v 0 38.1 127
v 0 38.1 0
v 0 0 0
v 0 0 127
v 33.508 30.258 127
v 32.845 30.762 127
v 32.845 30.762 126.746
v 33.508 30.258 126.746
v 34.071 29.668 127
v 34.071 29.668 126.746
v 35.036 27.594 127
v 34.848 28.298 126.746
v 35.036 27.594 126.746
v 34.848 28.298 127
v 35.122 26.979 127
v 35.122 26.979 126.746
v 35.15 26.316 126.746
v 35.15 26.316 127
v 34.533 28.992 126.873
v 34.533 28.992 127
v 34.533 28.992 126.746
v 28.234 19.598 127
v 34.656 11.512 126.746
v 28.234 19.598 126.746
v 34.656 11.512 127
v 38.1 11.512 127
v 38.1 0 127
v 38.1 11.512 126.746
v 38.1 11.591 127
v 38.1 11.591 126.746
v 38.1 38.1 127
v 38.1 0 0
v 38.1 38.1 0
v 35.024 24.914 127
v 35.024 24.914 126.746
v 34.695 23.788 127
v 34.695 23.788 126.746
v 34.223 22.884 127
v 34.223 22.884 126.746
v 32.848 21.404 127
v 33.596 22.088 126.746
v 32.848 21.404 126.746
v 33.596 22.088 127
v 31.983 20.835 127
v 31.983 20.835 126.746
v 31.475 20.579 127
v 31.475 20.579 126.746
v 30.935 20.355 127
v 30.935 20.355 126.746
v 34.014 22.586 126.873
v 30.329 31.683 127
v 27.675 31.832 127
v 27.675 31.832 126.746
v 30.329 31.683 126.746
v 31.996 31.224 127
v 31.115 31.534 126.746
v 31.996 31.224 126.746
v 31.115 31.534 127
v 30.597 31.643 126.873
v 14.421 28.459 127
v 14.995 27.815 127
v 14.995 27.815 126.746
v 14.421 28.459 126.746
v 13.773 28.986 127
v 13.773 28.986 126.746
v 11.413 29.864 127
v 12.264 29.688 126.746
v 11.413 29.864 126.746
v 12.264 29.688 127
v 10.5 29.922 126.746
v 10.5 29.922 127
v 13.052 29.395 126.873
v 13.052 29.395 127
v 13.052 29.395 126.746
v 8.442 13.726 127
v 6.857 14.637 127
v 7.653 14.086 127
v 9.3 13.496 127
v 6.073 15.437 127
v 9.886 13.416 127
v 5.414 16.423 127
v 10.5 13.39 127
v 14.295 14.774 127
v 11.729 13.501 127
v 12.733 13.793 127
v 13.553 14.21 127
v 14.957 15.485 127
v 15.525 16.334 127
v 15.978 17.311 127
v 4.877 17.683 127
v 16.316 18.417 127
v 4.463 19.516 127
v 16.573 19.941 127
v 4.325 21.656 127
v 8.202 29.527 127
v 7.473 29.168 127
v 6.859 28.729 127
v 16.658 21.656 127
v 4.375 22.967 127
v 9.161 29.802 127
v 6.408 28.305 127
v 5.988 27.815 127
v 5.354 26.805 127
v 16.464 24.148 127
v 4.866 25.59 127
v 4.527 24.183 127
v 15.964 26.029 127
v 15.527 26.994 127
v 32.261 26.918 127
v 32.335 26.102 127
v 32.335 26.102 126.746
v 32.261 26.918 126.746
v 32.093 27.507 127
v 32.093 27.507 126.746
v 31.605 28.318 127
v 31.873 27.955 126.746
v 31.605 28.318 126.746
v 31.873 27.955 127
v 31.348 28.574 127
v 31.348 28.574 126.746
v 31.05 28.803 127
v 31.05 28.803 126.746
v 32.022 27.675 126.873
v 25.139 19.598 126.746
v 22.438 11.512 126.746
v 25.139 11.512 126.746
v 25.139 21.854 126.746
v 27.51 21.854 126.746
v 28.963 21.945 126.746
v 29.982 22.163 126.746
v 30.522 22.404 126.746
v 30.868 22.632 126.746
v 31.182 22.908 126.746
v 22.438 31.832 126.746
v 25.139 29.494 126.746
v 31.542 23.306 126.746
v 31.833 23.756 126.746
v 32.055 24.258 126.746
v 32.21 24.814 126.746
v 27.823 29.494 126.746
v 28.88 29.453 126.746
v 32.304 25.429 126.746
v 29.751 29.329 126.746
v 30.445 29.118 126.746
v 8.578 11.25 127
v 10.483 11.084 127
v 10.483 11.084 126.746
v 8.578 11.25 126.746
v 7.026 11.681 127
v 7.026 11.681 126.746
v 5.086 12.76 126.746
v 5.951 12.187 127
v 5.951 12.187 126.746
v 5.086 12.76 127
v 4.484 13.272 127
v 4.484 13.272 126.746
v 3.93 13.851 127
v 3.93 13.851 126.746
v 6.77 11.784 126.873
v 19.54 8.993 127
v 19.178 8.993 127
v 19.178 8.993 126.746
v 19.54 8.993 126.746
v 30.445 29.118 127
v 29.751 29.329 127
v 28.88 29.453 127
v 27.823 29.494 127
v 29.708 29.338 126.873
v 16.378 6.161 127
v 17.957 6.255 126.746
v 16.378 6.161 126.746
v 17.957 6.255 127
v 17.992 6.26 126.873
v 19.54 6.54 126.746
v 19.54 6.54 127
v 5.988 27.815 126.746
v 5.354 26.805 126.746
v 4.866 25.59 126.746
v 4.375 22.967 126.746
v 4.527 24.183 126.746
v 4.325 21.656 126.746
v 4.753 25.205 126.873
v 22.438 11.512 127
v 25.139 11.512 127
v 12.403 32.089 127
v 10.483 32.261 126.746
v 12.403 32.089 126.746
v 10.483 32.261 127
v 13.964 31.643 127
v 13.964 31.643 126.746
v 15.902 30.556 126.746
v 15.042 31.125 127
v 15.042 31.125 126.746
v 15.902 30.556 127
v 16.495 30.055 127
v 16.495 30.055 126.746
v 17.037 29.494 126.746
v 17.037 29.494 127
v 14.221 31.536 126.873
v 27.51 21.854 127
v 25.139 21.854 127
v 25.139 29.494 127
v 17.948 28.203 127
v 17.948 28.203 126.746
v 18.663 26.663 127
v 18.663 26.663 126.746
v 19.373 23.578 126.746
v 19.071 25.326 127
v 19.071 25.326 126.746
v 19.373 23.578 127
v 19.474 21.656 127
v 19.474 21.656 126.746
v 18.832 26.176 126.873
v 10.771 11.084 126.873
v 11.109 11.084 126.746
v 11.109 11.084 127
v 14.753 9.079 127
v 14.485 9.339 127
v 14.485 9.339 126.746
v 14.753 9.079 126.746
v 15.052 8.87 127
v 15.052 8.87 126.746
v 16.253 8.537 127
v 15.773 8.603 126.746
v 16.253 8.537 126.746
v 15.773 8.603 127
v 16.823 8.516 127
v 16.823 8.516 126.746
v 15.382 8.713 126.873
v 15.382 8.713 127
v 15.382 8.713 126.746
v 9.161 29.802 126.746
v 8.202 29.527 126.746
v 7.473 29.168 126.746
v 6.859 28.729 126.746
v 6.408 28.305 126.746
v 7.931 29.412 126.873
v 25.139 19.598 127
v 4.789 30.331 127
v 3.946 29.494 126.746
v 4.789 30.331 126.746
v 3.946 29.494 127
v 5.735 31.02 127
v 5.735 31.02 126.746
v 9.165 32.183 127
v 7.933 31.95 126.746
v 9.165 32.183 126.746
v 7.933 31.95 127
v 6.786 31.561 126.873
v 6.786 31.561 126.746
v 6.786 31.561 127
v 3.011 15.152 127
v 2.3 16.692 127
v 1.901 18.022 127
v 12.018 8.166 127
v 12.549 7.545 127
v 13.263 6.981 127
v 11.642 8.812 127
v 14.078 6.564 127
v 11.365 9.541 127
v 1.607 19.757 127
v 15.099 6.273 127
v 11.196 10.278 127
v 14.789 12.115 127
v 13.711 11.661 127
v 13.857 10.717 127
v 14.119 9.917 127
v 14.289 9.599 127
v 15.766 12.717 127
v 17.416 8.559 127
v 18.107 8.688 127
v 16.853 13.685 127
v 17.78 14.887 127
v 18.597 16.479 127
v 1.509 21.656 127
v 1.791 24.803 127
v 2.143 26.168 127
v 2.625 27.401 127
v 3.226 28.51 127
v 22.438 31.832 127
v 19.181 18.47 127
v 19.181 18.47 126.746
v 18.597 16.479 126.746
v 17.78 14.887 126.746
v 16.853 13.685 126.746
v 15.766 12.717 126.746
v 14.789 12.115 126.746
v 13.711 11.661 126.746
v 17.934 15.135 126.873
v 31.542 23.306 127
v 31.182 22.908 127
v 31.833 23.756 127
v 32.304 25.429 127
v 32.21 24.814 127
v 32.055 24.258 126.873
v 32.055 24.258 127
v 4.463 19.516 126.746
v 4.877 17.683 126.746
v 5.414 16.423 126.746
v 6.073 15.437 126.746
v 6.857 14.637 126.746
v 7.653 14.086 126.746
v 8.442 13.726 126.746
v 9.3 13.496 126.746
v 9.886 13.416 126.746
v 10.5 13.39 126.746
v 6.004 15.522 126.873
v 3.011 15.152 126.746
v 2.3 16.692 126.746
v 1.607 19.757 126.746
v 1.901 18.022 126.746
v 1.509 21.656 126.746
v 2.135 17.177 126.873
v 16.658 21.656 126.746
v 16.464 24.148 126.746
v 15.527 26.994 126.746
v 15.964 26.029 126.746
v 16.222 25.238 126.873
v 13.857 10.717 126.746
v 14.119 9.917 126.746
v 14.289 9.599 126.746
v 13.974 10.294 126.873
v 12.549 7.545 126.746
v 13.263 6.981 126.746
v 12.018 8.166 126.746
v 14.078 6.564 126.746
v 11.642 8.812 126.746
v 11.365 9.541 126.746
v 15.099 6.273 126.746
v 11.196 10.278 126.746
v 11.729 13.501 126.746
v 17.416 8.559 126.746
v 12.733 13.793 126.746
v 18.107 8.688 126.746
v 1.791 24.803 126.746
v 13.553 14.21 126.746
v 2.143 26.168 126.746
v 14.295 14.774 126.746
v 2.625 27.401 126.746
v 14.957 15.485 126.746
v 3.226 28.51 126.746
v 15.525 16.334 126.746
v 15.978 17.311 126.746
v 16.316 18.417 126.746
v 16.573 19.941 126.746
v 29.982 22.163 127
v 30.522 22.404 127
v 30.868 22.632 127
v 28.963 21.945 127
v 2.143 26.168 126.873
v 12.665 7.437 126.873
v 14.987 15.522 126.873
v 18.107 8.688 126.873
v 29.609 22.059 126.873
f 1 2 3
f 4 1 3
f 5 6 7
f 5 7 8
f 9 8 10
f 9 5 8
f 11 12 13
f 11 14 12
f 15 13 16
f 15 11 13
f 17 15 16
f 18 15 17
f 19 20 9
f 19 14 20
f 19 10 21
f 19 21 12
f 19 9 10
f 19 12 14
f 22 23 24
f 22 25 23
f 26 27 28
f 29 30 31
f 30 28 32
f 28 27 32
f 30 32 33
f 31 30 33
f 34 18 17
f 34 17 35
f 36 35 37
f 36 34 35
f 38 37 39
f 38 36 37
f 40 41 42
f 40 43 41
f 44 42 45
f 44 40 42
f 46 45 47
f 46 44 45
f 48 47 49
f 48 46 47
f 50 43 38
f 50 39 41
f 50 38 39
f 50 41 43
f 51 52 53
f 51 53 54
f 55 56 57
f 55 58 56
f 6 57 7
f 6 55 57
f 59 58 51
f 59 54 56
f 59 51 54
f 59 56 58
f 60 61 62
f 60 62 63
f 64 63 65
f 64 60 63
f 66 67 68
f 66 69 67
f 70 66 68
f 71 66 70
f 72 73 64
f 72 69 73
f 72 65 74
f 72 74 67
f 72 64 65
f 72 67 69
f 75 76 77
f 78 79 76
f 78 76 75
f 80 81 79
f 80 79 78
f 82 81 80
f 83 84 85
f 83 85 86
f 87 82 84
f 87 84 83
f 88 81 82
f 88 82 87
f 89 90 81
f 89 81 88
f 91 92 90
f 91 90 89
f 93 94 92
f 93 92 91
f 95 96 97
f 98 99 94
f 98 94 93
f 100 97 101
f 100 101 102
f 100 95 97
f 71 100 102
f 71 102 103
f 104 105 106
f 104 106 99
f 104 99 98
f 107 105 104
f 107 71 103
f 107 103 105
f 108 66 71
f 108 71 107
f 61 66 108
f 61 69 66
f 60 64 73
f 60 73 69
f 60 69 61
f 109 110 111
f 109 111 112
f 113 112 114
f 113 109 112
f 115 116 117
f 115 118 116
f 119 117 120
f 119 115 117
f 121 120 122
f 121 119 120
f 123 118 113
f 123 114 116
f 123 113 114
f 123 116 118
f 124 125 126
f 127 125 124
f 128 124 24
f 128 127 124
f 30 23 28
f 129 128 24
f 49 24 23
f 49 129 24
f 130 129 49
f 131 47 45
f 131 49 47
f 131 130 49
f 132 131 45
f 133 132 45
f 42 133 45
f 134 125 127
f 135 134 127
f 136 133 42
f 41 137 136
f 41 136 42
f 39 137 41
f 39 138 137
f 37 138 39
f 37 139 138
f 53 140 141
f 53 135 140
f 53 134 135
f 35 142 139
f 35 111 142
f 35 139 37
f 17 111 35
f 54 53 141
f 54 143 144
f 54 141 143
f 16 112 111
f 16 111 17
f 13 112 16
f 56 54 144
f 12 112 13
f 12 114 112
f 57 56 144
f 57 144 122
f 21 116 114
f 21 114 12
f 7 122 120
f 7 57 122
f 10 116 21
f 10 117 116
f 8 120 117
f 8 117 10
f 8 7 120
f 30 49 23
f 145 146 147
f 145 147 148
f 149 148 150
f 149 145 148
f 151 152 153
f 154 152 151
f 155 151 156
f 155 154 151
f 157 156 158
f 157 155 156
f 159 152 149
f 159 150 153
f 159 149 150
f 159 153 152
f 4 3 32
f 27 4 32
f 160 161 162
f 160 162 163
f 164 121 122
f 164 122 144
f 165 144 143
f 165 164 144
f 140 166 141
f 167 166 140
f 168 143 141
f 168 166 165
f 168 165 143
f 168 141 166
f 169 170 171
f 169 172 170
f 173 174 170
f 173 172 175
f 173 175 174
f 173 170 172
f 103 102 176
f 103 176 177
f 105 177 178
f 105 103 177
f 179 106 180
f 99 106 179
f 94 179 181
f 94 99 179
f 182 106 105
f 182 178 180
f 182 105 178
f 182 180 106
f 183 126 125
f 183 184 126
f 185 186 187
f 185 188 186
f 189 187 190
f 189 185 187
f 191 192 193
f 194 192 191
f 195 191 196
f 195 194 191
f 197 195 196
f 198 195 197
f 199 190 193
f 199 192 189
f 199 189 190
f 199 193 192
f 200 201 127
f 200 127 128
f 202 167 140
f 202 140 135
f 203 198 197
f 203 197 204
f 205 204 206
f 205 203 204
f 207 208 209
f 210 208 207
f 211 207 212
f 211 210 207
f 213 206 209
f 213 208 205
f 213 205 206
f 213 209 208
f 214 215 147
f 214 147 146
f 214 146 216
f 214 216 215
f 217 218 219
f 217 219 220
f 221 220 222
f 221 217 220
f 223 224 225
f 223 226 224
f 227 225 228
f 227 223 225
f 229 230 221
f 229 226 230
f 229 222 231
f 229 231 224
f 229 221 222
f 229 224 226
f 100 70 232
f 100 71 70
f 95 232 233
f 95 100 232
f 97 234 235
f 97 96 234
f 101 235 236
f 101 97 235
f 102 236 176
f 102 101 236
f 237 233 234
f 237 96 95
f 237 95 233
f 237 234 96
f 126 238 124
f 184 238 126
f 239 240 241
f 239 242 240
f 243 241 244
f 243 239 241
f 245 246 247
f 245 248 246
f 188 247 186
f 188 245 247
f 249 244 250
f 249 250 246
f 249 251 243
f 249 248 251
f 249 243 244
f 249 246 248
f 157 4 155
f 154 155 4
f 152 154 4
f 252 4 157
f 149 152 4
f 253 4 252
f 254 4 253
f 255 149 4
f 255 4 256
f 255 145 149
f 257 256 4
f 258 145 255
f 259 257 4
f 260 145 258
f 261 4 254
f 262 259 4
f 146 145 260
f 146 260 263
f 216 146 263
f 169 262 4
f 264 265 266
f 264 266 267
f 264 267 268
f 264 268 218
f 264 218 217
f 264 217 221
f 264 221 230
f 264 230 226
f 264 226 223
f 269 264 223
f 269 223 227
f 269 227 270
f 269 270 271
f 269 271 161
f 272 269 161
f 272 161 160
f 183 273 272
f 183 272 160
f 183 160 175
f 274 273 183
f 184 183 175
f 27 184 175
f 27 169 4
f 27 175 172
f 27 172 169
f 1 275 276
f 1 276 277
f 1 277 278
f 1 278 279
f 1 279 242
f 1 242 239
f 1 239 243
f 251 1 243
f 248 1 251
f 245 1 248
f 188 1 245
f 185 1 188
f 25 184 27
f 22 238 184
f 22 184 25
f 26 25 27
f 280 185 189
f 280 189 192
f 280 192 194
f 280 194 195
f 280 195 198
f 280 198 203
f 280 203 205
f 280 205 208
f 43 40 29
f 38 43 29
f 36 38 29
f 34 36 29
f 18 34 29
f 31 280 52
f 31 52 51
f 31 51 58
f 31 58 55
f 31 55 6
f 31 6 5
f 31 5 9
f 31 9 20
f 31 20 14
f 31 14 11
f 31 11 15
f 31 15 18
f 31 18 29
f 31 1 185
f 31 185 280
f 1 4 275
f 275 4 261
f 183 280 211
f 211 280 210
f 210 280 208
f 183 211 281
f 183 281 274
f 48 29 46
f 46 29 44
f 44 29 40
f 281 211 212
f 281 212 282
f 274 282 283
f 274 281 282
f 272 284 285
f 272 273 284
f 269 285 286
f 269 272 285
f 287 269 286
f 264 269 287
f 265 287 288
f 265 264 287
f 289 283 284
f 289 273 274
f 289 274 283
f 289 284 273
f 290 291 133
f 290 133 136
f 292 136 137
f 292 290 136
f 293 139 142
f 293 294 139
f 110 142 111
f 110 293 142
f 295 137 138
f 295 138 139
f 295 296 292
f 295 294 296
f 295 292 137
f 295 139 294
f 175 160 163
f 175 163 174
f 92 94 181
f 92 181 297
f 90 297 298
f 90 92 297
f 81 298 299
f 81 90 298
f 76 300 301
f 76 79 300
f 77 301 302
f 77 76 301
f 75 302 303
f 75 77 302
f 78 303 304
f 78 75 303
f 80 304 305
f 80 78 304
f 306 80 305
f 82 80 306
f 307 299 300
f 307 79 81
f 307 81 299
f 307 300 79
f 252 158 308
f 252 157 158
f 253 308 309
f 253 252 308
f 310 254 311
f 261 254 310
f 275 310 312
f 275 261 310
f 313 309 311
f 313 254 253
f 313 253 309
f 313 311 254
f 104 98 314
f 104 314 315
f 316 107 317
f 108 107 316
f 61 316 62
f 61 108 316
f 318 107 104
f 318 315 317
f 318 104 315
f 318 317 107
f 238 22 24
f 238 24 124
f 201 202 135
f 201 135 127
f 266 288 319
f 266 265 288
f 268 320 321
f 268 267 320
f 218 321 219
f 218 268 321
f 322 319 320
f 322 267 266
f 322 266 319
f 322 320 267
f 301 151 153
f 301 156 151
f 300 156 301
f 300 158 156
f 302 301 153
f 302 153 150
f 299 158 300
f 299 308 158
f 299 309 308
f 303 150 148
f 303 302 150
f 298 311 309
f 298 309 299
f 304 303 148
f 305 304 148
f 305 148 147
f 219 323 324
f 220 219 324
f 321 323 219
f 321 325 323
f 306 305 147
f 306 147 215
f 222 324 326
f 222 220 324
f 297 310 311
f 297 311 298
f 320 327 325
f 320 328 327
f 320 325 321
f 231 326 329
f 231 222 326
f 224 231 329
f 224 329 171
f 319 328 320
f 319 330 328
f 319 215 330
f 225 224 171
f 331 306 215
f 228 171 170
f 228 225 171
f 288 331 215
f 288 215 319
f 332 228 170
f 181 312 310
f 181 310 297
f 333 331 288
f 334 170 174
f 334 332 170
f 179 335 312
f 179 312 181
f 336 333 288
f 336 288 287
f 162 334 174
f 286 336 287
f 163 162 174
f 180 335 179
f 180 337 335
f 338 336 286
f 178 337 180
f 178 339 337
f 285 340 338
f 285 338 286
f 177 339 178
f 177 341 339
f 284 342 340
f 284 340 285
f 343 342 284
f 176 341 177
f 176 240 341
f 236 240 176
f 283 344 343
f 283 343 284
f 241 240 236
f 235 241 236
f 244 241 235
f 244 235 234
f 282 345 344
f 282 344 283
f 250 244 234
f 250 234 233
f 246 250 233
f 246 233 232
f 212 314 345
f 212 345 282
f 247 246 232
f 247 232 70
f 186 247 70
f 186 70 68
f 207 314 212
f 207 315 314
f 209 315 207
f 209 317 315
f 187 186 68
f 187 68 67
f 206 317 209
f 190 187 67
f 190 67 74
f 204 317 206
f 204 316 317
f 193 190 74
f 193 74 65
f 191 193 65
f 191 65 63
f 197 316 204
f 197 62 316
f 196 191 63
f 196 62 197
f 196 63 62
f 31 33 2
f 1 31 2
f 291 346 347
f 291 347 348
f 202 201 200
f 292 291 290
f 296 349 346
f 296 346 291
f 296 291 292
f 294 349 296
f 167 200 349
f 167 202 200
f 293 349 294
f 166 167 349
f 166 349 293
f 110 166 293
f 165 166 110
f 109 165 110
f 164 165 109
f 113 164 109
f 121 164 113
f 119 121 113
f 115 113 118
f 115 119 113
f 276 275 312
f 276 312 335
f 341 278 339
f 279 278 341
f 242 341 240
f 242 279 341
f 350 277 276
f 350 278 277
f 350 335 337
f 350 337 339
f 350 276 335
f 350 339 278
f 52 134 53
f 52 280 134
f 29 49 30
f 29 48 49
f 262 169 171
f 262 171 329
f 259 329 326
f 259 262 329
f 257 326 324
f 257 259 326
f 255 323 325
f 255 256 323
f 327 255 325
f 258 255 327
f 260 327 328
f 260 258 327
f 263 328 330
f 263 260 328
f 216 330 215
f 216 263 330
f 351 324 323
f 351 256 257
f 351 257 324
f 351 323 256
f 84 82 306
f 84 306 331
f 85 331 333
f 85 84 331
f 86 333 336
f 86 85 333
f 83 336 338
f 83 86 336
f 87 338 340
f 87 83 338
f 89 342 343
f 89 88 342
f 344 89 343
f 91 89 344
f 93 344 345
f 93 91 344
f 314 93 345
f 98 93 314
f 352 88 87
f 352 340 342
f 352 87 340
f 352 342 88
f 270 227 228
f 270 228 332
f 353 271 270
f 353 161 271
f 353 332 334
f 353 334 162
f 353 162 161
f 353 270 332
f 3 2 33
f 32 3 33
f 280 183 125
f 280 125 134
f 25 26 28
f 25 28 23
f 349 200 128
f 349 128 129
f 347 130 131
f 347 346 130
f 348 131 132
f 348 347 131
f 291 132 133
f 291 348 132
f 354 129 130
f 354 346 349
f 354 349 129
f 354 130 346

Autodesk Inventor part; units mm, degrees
ref_plane "YZ Plane" through (0, 0, 0) normal (1, 0, 0) x (0, 1, 0)
ref_plane "XZ Plane" through (0, 0, 0) normal (0, 1, 0) x (-1, 0, 0)
ref_plane "XY Plane" through (0, 0, 0) normal (0, 0, 1) x (1, 0, 0)
sketch "Sketch1" plane through (0, 0, 0) normal (0, 0, 1) x (1, 0, 0)
  line L0 (0, 0) -> (38.1, 0)
  line L1 (38.1, 0) -> (38.1, 38.1)
  line L2 (38.1, 38.1) -> (0, 38.1)
  line L3 (0, 38.1) -> (0, 0)
  dimension "d0" = 38.1
  dimension "d1" = 38.1
extrude "Extrusion1" add sketch "Sketch1" along normal blind 127
sketch "Sketch2" plane through (0, 0, 127) normal (0, 0, 1) x (1, 0, 0)
  line L0 (0.6032, 32.2606) -> (46.9983, 32.2606) construction
  line L1 (46.9983, 32.2606) -> (46.9983, -9.6319) construction
  line L2 (46.9983, -9.6319) -> (0.6032, -9.6319) construction
  line L3 (0.6032, -9.6319) -> (0.6032, 32.2606) construction
  spline S0 degree 2 poles (19.54, 6.5395) (18.799, 6.3584) (17.1852, 6.1608) (16.3784, 6.1608) knots 0 0 0 1 2 2 2
  spline S1 degree 2 poles (16.3784, 6.1608) (14.0895, 6.1608) (11.2407, 8.7131) (11.109, 11.0843) knots 0 0 0 1 2 2 2
  spline S2 degree 2 poles (11.109, 11.0843) (10.9279, 11.0843) (10.615, 11.0843) (10.4833, 11.0843) knots 0 0 0 1 2 2 2
  spline S3 degree 2 poles (10.4833, 11.0843) (8.4249, 11.0843) (5.1151, 12.484) (3.9295, 13.8508) knots 0 0 0 1 2 2 2
  spline S4 degree 2 poles (3.9295, 13.8508) (2.7604, 15.201) (1.5089, 19.1531) (1.5089, 21.656) knots 0 0 0 1 2 2 2
  spline S5 degree 2 poles (1.5089, 21.656) (1.5089, 24.2248) (2.7768, 28.111) (3.946, 29.4942) knots 0 0 0 1 2 2 2
  spline S6 degree 2 poles (3.946, 29.4942) (5.1316, 30.8609) (8.4414, 32.2606) (10.4833, 32.2606) knots 0 0 0 1 2 2 2
  spline S7 degree 2 poles (10.4833, 32.2606) (12.5581, 32.2606) (15.8844, 30.8115) (17.037, 29.4942) knots 0 0 0 1 2 2 2
  spline S8 degree 2 poles (17.037, 29.4942) (18.1897, 28.1604) (19.4741, 24.1919) (19.4741, 21.656) knots 0 0 0 1 2 2 2
  spline S9 degree 2 poles (19.4741, 21.656) (19.4741, 17.704) (16.3948, 12.5664) (13.7108, 11.6607) knots 0 0 0 1 2 2 2
  spline S10 degree 2 poles (13.7108, 11.6607) (13.7766, 10.9032) (14.1718, 9.6847) (14.4847, 9.3389) knots 0 0 0 1 2 2 2
  spline S11 degree 2 poles (14.4847, 9.3389) (14.8634, 8.9107) (15.9008, 8.5155) (16.823, 8.5155) knots 0 0 0 1 2 2 2
  spline S12 degree 2 poles (16.823, 8.5155) (17.3664, 8.5155) (18.8484, 8.8613) (19.1777, 8.9931) knots 0 0 0 1 2 2 2
  line L4 (19.1777, 8.9931) -> (19.54, 8.9931)
  line L5 (19.54, 8.9931) -> (19.54, 6.5395)
  spline S13 degree 2 poles (16.6583, 21.656) (16.6583, 23.6814) (15.7856, 26.7936) (14.9952, 27.8146) knots 0 0 0 1 2 2 2
  spline S14 degree 2 poles (14.9952, 27.8146) (14.1883, 28.8685) (11.9159, 29.9223) (10.4997, 29.9223) knots 0 0 0 1 2 2 2
  spline S15 degree 2 poles (10.4997, 29.9223) (9.0342, 29.9223) (6.8276, 28.9014) (5.9878, 27.8146) knots 0 0 0 1 2 2 2
  spline S16 degree 2 poles (5.9878, 27.8146) (5.181, 26.7772) (4.3247, 23.632) (4.3247, 21.656) knots 0 0 0 1 2 2 2
  spline S17 degree 2 poles (4.3247, 21.656) (4.3247, 17.6546) (7.6839, 13.3897) (10.4997, 13.3897) knots 0 0 0 1 2 2 2
  spline S18 degree 2 poles (10.4997, 13.3897) (13.3156, 13.3897) (16.6583, 17.6546) (16.6583, 21.656) knots 0 0 0 1 2 2 2
  line L6 (38.1639, 11.5125) -> (34.6565, 11.5125)
  line L7 (34.6565, 11.5125) -> (28.2345, 19.5977)
  line L8 (28.2345, 19.5977) -> (25.1387, 19.5977)
  line L9 (25.1387, 19.5977) -> (25.1387, 11.5125)
  line L10 (25.1387, 11.5125) -> (22.4381, 11.5125)
  line L11 (22.4381, 11.5125) -> (22.4381, 31.8325)
  line L12 (22.4381, 31.8325) -> (27.6746, 31.8325)
  spline S19 degree 2 poles (27.6746, 31.8325) (29.4201, 31.8325) (31.7748, 31.4537) (32.8452, 30.7621) knots 0 0 0 1 2 2 2
  spline S20 degree 2 poles (32.8452, 30.7621) (33.9155, 30.0705) (35.1505, 27.9134) (35.1505, 26.3161) knots 0 0 0 1 2 2 2
  spline S21 degree 2 poles (35.1505, 26.3161) (35.1505, 24.0931) (32.8781, 21.0797) (30.935, 20.3551) knots 0 0 0 1 2 2 2
  line L13 (30.935, 20.3551) -> (38.1639, 11.5125)
  spline S22 degree 2 poles (32.3347, 26.102) (32.3347, 26.9913) (31.7089, 28.358) (31.0503, 28.8026) knots 0 0 0 1 2 2 2
  spline S23 degree 2 poles (31.0503, 28.8026) (30.4739, 29.1813) (28.9425, 29.4942) (27.8228, 29.4942) knots 0 0 0 1 2 2 2
  line L14 (27.8228, 29.4942) -> (25.1387, 29.4942)
  line L15 (25.1387, 29.4942) -> (25.1387, 21.8536)
  line L16 (25.1387, 21.8536) -> (27.5099, 21.8536)
  spline S24 degree 2 poles (27.5099, 21.8536) (28.6791, 21.8536) (30.5398, 22.2653) (31.182, 22.9075) knots 0 0 0 1 2 2 2
  spline S25 degree 2 poles (31.182, 22.9075) (31.7748, 23.4674) (32.3347, 25.0482) (32.3347, 26.102) knots 0 0 0 1 2 2 2
  point P0 (0, 0)
extrude "Extrusion3" cut sketch "Sketch2" against normal blind 0.254
properties part number "Container 2 2 5 colored color 2"
